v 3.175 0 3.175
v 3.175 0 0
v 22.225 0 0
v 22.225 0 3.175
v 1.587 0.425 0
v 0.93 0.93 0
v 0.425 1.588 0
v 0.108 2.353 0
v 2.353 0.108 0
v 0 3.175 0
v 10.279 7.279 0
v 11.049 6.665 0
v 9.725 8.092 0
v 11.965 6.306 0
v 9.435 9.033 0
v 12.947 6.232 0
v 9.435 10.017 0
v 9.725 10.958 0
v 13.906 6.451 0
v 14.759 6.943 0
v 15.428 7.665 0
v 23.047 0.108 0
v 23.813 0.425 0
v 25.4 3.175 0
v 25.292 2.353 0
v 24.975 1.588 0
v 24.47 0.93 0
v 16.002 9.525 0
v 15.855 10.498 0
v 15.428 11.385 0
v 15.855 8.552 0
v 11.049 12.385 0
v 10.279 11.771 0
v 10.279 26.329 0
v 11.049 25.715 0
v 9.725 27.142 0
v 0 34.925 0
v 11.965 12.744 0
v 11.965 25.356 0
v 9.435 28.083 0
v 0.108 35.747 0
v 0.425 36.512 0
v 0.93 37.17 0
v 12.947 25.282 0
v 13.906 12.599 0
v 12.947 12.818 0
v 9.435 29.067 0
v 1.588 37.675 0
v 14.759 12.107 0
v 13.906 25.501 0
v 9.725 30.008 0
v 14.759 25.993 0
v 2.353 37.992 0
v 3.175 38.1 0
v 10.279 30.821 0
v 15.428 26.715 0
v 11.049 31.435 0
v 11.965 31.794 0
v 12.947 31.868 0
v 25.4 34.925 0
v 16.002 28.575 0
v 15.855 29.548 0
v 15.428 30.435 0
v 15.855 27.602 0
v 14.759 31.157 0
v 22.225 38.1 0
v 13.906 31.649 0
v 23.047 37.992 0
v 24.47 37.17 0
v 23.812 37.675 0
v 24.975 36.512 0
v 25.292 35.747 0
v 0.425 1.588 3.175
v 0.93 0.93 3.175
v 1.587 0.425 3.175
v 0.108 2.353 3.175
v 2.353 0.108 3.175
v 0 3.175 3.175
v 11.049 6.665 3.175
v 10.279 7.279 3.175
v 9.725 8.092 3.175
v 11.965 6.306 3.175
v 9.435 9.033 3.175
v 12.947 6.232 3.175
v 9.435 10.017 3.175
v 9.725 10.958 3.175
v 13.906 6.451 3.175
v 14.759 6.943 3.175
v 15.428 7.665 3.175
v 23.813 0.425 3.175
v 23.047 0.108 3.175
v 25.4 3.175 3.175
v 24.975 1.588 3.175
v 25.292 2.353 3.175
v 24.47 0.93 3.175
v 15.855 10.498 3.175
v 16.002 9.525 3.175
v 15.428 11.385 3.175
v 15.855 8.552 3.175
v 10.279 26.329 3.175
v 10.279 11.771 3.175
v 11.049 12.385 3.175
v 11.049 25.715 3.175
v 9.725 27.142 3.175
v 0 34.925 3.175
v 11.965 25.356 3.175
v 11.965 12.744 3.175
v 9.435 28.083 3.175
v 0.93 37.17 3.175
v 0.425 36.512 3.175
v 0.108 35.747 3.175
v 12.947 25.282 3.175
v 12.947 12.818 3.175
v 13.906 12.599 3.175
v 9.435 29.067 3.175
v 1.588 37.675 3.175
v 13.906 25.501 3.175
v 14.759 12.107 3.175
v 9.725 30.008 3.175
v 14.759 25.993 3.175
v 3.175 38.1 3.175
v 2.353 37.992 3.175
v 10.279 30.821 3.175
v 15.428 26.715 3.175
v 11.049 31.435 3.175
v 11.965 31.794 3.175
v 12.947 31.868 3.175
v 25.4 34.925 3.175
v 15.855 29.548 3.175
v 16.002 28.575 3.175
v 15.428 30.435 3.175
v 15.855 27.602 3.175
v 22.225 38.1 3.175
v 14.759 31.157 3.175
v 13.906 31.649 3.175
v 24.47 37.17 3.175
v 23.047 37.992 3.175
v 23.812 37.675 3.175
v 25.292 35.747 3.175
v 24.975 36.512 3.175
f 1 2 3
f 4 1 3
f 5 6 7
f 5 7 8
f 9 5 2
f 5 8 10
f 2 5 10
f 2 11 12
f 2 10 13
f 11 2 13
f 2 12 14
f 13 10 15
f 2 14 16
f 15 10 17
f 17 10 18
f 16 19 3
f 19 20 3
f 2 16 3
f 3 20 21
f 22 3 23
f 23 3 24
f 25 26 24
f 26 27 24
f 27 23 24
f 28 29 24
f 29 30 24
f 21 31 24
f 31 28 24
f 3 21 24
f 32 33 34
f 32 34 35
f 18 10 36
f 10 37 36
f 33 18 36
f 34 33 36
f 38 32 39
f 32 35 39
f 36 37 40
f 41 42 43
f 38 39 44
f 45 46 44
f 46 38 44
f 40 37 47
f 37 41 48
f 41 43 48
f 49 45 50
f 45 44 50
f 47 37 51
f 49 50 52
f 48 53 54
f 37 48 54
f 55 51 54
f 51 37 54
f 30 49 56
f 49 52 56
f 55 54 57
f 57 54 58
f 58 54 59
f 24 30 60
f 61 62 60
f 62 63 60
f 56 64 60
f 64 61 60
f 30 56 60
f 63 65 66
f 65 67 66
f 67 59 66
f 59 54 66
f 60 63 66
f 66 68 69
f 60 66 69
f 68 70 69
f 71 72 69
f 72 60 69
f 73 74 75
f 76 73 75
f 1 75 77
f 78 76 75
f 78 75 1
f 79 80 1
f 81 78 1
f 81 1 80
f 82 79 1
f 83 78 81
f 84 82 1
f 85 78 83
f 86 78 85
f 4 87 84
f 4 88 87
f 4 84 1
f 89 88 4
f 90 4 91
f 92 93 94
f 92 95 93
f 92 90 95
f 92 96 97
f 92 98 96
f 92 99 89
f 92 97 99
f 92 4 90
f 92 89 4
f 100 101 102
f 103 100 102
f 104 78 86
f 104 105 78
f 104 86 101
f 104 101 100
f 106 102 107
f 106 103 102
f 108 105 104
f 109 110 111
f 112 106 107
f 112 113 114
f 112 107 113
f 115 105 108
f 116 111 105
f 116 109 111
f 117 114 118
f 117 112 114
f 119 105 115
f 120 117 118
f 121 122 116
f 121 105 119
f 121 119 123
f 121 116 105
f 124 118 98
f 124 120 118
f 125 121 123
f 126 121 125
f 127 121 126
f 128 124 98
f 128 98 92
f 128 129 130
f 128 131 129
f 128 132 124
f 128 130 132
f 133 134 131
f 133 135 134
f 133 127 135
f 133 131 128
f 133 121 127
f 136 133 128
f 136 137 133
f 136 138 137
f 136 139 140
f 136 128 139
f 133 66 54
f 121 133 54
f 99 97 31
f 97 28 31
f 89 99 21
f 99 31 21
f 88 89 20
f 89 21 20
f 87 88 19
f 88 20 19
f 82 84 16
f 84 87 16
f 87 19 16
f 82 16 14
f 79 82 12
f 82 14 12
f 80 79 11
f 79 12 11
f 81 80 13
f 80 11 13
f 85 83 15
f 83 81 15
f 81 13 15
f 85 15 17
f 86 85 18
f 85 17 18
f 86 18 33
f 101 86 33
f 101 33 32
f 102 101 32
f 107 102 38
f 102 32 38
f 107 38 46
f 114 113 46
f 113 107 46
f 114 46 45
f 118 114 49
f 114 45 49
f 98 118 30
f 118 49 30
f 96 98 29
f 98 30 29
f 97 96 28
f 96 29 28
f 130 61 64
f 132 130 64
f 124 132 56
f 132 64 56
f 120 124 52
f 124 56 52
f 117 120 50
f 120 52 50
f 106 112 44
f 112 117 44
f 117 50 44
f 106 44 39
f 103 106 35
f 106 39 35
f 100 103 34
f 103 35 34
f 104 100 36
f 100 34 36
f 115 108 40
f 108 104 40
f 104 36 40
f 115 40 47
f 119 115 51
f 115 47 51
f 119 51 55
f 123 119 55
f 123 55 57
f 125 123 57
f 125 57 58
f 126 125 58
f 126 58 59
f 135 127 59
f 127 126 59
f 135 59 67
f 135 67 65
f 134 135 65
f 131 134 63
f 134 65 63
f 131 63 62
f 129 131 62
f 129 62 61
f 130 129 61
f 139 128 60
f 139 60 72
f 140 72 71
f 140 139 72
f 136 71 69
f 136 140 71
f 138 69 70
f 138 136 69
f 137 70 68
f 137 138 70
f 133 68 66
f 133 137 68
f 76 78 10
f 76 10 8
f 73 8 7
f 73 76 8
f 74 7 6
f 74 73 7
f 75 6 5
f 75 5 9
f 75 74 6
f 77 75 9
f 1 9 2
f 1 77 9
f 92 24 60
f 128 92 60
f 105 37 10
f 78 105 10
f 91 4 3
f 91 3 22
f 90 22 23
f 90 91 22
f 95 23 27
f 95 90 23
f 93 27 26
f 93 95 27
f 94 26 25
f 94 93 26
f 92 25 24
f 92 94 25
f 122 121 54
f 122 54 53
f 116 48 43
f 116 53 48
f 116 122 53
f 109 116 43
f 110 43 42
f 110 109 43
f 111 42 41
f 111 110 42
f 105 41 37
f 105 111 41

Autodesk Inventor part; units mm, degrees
ref_plane "YZ Plane" through (0, 0, 0) normal (1, 0, 0) x (0, 1, 0)
ref_plane "XZ Plane" through (0, 0, 0) normal (0, 1, 0) x (-1, 0, 0)
ref_plane "XY Plane" through (0, 0, 0) normal (0, 0, 1) x (1, 0, 0)
sketch "Sketch1" plane through (0, 0, 0) normal (0, 0, 1) x (1, 0, 0)
  line L0 (0, 0) -> (25.4, 0)
  line L1 (25.4, 0) -> (25.4, 38.1)
  line L2 (25.4, 38.1) -> (0, 38.1)
  line L3 (0, 38.1) -> (0, 0)
  line L4 (12.7, 38.1) -> (12.7, 0) construction
  circle A0 centre (12.7, 28.575) radius 3.302
  circle A1 centre (12.7, 9.525) radius 3.302
  dimension "d0" = 25.4
  dimension "d2" = 38.1
  dimension "d3" = 6.604
  dimension "d4" = 19.05
  dimension "d5" = 9.525
  dimension "d9" = 9.525
extrude "Extrusion1" add sketch "Sketch1" along normal blind 3.175
fillet "Fillet1" radius 3.175 4 edges at (25.4, 38.1, 1.5875) (0, 38.1, 1.5875) (25.4, 0, 1.5875) (0, 0, 1.5875)
properties part number "Chassis Tower Support Plate (for Bracket 1)" material "Aluminum 6061"
